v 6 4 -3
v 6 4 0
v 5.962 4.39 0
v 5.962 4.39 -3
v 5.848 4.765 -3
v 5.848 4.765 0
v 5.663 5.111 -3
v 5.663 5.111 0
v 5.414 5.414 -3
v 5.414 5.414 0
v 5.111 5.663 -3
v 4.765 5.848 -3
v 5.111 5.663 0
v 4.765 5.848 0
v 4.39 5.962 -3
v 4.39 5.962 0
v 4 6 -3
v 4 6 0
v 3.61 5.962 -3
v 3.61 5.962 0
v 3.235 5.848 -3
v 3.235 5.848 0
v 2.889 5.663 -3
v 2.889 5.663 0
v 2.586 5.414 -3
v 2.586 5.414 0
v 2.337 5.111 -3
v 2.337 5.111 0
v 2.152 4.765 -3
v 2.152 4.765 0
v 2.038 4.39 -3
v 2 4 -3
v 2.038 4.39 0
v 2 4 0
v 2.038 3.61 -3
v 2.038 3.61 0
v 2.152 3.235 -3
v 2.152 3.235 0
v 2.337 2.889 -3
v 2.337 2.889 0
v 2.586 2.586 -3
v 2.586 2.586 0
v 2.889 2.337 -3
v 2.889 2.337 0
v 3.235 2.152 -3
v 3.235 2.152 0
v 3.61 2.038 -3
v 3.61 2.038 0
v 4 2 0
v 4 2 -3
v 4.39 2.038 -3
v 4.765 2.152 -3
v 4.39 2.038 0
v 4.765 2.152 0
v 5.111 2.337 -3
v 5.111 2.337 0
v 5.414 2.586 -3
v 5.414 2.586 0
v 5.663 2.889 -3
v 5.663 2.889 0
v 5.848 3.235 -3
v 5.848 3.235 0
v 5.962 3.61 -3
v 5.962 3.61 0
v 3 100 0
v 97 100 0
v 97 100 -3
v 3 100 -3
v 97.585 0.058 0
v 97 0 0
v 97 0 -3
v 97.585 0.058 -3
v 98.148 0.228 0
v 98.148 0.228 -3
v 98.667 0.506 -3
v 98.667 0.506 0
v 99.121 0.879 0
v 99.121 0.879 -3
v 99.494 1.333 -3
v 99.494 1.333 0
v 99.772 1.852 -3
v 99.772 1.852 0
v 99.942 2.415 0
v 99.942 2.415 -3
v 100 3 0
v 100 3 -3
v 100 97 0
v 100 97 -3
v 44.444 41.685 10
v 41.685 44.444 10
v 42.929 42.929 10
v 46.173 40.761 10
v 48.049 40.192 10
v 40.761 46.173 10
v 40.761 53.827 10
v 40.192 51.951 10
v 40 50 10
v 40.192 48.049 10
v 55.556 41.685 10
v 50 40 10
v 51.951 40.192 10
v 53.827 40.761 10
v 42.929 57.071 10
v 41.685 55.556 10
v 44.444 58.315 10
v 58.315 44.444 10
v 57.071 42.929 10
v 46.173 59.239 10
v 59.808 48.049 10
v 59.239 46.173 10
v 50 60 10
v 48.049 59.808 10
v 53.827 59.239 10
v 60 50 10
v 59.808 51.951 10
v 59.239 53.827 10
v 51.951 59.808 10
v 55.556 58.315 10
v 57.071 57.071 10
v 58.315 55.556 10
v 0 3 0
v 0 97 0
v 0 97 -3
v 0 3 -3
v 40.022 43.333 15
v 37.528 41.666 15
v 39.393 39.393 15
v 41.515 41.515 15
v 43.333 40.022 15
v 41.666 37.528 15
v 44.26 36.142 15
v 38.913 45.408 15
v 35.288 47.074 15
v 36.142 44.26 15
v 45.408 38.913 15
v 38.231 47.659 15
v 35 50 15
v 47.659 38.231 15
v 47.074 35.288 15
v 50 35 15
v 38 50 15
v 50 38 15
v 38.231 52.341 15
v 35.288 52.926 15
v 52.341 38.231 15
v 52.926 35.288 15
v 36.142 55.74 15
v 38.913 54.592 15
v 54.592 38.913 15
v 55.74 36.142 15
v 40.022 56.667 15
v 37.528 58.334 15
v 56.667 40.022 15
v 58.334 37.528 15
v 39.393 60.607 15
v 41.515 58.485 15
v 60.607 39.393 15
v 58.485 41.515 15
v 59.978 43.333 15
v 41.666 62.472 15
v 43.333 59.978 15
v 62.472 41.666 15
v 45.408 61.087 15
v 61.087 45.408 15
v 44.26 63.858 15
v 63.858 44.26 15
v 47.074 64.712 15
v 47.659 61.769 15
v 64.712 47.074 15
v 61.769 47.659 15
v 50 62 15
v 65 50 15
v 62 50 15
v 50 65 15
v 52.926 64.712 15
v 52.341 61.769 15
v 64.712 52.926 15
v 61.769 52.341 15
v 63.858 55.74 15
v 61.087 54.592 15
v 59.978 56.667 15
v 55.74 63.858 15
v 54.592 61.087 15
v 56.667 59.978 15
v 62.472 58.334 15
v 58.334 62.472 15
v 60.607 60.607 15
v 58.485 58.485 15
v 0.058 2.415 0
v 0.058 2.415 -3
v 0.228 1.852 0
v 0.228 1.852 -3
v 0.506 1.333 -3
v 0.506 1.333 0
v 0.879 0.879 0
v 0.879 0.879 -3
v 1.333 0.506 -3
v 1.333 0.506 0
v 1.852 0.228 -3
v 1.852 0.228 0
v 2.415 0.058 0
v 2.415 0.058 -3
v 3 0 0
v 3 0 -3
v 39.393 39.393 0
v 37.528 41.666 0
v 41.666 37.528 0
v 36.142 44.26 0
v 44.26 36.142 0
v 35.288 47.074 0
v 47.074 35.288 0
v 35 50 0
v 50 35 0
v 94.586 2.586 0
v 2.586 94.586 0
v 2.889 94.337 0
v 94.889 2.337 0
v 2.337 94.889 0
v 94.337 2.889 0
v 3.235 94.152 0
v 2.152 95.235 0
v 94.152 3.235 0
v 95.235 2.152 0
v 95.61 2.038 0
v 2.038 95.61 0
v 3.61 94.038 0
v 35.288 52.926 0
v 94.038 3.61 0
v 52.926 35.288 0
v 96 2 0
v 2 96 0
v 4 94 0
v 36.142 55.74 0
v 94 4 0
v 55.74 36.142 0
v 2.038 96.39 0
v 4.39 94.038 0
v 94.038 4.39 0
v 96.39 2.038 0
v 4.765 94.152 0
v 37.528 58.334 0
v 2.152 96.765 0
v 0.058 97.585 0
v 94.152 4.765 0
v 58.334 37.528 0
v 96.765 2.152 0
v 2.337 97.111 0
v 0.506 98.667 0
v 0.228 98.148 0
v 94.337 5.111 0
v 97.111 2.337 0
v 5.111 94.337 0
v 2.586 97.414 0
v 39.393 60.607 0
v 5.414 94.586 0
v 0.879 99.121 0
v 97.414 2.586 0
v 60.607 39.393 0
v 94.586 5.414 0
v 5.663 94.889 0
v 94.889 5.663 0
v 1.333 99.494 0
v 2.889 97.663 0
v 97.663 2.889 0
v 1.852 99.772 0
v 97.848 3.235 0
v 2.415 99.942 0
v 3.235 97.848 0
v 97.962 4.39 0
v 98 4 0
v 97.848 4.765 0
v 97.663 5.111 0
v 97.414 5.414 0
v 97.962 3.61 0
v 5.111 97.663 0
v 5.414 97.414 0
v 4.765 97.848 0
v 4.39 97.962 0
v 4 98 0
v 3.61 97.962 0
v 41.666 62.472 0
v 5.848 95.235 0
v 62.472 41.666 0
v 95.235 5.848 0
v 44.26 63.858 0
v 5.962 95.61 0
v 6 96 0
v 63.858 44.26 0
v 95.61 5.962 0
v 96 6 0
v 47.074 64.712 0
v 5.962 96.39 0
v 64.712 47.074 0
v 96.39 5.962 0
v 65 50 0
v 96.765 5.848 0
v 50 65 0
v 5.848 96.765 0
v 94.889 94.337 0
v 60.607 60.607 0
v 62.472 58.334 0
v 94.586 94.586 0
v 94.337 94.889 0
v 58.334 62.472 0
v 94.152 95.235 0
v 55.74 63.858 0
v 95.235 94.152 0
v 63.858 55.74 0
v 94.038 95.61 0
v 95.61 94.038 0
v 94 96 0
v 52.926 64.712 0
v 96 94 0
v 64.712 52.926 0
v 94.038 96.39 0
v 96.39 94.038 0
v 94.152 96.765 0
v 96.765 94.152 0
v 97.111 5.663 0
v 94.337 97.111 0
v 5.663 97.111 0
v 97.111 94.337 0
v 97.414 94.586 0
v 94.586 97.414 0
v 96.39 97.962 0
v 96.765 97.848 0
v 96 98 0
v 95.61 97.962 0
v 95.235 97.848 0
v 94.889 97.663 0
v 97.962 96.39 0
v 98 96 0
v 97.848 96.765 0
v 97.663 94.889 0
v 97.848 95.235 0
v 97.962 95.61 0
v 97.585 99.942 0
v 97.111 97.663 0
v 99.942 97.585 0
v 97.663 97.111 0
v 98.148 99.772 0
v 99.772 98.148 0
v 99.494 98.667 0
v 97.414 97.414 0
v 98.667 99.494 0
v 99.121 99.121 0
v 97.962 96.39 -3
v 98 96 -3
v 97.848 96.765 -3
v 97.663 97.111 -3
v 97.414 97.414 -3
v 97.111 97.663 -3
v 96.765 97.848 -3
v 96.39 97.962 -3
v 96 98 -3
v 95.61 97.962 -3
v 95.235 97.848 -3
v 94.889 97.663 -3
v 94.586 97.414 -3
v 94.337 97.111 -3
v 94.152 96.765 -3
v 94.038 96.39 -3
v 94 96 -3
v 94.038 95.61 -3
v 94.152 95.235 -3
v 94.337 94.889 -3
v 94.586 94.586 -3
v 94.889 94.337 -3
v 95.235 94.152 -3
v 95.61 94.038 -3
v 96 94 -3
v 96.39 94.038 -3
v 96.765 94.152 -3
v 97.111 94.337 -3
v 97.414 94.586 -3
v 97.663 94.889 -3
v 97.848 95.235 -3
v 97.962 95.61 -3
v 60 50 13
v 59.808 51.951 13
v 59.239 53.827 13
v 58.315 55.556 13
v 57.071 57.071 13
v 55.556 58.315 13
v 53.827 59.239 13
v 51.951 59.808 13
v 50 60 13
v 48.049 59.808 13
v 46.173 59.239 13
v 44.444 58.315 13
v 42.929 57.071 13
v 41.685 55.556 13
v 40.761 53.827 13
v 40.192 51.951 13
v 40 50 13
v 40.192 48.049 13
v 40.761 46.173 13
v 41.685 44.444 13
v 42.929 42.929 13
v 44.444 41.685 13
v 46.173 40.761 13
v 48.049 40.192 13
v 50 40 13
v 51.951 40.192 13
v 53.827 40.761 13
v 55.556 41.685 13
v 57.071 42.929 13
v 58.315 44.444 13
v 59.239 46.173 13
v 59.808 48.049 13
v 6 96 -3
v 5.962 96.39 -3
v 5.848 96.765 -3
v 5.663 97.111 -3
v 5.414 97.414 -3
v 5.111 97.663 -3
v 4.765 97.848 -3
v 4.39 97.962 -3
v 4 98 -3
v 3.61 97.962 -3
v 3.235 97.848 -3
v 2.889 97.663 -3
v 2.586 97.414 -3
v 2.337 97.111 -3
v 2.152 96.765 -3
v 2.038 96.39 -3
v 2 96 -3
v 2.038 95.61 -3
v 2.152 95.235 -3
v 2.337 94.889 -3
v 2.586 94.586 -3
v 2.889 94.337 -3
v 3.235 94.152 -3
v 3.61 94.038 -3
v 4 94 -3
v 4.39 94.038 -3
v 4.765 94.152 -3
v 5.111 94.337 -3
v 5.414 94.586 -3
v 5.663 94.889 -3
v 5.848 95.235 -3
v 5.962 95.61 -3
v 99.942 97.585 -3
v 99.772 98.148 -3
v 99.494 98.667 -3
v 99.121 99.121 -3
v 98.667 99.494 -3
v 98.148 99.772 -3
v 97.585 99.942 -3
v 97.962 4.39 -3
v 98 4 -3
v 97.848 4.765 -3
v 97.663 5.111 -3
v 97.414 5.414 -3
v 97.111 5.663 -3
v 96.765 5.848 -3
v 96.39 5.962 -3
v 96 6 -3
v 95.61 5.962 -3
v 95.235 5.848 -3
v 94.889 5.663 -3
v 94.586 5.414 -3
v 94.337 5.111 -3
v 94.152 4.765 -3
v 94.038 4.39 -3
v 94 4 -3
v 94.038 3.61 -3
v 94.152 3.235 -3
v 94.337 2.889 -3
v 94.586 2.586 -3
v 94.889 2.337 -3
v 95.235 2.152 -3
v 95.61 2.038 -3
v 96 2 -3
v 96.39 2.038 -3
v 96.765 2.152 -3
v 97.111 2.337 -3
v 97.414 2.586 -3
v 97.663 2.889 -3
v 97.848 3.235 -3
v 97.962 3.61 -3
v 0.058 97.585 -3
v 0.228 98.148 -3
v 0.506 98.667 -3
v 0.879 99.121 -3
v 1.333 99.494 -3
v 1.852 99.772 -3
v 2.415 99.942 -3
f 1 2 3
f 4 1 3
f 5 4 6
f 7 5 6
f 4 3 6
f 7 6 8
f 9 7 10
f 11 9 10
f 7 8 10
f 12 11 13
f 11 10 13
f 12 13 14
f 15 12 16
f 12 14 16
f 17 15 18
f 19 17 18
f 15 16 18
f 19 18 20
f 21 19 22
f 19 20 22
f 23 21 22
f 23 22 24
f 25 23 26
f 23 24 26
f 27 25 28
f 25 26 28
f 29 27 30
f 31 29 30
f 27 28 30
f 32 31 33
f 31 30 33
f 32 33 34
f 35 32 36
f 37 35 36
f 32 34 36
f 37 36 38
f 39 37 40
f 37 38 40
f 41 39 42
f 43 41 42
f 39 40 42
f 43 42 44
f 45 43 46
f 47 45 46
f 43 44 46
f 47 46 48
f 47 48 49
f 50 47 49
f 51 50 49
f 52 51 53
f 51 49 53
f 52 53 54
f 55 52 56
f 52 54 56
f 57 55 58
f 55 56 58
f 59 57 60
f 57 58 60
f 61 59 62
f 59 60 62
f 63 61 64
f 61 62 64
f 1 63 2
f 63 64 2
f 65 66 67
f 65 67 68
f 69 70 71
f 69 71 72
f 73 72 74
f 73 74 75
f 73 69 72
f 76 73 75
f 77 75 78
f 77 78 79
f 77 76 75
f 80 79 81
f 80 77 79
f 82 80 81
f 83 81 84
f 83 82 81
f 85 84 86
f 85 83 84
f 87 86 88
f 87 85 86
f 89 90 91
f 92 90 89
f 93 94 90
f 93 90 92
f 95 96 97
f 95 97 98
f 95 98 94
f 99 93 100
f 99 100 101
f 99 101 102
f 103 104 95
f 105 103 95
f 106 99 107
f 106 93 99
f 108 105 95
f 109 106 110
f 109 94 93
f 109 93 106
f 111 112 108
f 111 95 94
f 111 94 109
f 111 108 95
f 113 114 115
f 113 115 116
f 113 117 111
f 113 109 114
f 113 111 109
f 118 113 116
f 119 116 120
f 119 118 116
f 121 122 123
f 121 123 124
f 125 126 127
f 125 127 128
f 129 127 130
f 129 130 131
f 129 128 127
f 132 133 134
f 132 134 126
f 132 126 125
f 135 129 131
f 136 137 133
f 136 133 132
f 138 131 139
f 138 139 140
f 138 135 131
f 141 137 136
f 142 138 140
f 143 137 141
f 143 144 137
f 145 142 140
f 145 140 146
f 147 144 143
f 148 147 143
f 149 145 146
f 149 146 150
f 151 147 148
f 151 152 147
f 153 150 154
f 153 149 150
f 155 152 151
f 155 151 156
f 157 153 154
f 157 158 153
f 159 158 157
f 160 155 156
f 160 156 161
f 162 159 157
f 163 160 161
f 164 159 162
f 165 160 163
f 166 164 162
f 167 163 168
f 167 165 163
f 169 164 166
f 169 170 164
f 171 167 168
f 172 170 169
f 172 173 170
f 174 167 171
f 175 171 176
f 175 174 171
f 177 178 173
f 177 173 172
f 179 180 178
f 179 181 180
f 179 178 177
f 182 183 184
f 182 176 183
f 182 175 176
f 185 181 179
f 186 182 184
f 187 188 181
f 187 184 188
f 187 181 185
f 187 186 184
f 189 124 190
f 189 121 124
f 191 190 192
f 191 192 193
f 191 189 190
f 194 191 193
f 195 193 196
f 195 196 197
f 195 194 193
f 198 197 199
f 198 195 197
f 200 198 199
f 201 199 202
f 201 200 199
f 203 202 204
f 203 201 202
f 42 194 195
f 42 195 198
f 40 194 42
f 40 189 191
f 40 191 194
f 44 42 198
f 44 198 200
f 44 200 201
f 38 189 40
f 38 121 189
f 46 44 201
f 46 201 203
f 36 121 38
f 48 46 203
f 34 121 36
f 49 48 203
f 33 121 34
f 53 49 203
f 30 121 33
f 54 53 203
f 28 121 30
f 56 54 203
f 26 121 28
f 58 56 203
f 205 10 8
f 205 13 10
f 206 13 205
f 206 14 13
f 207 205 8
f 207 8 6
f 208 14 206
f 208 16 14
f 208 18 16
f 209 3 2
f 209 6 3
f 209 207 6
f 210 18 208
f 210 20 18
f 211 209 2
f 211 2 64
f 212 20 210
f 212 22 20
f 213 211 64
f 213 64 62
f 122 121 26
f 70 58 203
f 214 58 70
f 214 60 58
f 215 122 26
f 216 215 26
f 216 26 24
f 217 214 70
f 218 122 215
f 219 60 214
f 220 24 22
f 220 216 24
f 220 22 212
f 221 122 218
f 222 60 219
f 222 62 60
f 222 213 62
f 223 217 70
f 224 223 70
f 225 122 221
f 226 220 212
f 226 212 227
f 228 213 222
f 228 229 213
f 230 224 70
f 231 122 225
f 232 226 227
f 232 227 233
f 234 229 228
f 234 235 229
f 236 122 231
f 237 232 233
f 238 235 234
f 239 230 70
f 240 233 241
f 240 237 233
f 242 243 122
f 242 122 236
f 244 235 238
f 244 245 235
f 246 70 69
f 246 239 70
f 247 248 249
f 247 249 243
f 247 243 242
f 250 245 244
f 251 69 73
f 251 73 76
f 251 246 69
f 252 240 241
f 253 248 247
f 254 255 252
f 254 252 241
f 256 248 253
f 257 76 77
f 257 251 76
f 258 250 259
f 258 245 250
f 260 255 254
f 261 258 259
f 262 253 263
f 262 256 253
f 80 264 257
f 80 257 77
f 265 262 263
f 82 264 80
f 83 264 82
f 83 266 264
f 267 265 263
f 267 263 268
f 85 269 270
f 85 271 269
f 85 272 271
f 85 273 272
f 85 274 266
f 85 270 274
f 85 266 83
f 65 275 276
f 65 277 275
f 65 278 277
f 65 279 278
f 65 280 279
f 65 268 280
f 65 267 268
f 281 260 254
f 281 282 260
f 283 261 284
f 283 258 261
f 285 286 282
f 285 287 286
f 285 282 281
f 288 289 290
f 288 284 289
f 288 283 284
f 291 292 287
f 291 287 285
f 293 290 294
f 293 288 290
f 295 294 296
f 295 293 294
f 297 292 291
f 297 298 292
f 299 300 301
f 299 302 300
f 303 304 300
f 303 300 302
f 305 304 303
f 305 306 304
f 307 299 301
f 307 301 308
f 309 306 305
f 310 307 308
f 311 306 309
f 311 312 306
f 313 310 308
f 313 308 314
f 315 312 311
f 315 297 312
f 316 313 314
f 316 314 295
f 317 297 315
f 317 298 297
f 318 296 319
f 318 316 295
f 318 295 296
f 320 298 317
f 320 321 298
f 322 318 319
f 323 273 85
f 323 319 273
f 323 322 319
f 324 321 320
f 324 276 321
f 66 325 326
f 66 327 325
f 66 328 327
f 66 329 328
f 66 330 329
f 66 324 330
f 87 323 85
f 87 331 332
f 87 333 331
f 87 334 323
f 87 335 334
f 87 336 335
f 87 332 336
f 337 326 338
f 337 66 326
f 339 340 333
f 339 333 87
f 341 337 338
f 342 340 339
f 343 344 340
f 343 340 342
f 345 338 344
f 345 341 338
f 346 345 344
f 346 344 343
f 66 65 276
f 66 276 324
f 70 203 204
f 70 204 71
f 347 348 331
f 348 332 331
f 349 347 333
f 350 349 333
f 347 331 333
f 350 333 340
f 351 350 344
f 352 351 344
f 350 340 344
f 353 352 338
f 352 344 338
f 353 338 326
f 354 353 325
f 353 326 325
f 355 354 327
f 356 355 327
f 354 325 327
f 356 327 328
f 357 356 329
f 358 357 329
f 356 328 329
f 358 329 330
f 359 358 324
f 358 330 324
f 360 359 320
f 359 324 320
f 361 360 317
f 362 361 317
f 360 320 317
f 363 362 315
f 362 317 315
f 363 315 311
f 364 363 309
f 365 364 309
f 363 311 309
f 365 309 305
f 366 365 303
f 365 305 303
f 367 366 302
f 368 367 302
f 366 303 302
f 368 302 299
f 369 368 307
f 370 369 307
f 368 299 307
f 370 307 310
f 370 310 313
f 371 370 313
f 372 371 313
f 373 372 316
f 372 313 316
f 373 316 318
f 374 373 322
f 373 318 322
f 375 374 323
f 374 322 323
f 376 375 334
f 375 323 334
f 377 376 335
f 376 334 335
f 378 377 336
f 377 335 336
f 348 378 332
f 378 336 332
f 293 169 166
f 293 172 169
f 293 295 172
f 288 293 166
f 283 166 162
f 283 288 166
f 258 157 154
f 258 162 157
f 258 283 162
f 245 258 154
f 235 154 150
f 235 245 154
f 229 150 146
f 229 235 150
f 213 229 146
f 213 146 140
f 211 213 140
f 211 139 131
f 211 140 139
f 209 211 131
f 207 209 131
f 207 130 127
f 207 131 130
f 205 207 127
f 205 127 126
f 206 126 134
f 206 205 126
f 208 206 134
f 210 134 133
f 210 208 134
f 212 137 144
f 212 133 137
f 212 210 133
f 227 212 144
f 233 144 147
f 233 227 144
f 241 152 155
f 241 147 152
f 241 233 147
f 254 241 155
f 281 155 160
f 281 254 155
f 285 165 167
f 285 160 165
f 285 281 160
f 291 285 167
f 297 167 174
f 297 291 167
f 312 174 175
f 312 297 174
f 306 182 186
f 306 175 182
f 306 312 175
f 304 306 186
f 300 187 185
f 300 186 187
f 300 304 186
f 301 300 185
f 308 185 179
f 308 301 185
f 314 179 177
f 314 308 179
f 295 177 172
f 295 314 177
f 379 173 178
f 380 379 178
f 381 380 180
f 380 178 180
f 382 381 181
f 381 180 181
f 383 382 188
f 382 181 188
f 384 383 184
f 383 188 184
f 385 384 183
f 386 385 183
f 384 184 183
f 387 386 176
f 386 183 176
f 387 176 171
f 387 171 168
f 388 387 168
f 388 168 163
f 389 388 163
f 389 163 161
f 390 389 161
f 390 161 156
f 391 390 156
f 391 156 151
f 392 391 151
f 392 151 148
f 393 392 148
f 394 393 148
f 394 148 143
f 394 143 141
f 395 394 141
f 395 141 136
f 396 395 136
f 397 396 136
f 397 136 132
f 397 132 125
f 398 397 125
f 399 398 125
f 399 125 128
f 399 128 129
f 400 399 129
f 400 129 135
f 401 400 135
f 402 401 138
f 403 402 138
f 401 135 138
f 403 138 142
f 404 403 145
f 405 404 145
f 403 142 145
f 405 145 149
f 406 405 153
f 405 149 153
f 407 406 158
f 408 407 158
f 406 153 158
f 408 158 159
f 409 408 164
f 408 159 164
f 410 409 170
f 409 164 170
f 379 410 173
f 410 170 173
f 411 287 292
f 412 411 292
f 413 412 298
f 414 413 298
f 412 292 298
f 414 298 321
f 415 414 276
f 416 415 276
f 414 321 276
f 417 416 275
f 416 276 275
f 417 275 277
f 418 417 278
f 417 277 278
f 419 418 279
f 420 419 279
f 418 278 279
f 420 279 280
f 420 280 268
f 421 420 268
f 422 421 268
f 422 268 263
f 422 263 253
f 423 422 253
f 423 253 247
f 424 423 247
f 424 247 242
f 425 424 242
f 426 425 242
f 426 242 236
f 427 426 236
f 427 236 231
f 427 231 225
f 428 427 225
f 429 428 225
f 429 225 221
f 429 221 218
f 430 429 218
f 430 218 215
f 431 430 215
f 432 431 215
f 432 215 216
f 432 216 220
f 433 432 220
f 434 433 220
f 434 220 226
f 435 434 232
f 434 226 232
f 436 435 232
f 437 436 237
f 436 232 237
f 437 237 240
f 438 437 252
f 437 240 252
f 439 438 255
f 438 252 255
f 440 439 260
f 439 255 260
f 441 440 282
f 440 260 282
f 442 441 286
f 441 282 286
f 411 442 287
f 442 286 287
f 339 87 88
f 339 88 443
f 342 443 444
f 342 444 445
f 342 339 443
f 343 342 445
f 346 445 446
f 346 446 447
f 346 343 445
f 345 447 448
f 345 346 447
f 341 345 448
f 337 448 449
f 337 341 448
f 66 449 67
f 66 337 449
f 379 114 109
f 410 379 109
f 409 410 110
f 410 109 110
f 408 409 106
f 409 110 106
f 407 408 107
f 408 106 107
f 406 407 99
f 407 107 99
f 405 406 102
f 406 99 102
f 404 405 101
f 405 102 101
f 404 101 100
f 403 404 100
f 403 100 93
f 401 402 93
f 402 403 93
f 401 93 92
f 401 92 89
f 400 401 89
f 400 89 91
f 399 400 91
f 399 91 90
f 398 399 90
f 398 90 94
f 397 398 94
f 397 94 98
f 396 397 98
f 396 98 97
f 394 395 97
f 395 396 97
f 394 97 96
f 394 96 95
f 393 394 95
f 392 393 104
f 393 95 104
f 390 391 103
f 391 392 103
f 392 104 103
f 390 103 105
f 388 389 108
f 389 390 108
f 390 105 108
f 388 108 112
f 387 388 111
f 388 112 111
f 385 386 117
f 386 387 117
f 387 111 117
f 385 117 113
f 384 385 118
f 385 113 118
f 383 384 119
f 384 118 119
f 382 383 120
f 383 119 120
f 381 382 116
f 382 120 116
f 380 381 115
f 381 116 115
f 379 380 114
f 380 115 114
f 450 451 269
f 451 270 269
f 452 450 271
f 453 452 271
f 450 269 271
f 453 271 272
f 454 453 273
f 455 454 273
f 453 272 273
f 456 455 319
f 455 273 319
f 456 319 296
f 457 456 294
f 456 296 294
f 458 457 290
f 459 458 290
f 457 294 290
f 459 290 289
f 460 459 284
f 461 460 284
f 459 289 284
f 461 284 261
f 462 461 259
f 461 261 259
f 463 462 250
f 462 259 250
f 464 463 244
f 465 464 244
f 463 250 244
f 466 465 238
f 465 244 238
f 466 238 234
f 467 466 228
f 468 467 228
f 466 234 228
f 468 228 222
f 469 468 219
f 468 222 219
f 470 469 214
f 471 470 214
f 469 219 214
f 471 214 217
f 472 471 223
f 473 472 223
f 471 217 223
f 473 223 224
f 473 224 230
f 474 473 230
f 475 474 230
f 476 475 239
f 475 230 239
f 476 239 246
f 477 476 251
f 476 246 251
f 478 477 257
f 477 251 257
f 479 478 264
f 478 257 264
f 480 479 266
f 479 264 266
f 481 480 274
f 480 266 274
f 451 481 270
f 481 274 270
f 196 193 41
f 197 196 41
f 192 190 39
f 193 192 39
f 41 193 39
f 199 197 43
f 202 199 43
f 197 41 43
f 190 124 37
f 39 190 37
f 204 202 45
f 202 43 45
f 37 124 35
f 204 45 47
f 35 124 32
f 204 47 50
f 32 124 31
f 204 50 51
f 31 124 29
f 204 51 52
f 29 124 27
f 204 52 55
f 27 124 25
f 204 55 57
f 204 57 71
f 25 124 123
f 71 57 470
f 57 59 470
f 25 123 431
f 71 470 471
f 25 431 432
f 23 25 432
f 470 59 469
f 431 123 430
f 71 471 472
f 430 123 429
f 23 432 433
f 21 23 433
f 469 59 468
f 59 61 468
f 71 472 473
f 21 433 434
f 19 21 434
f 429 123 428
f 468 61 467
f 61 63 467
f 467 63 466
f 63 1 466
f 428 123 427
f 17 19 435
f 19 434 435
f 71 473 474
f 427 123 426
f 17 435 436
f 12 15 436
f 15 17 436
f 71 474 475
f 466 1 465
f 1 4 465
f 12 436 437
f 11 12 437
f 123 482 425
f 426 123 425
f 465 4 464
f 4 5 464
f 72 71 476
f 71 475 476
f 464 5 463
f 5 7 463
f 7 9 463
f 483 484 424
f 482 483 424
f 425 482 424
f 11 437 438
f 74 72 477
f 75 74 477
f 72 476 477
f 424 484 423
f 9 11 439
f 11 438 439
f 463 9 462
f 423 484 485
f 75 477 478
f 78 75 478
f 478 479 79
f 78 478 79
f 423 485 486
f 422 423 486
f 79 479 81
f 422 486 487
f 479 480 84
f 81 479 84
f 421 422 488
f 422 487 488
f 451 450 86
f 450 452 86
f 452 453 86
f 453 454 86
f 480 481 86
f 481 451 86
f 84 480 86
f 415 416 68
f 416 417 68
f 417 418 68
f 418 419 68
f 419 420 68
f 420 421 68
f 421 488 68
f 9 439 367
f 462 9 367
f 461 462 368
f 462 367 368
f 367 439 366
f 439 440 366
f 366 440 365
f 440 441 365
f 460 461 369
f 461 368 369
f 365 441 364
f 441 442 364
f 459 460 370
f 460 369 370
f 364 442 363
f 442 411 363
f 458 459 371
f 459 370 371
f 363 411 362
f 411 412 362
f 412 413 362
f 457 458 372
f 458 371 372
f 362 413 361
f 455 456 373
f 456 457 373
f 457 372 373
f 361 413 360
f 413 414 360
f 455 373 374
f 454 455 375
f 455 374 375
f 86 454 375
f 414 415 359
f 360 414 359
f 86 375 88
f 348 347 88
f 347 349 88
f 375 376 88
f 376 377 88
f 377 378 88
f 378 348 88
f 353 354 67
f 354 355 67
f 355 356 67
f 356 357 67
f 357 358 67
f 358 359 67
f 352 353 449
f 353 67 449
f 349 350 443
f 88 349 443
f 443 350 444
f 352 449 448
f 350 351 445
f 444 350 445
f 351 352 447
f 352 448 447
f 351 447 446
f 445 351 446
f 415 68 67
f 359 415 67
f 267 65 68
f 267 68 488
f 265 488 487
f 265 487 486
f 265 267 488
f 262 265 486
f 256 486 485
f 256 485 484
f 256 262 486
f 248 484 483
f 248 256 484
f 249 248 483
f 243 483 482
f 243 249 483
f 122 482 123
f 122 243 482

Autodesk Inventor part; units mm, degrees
ref_plane "YZ Plane" through (0, 0, 0) normal (1, 0, 0) x (0, 1, 0)
ref_plane "XZ Plane" through (0, 0, 0) normal (0, 1, 0) x (-1, 0, 0)
ref_plane "XY Plane" through (0, 0, 0) normal (0, 0, 1) x (1, 0, 0)
sketch "Sketch1" plane through (0, 0, 0) normal (0, 0, 1) x (1, 0, 0)
  line L0 (3, 0) -> (97, 0)
  line L1 (100, 3) -> (100, 97)
  line L2 (97, 100) -> (3, 100)
  line L3 (0, 97) -> (0, 3)
  line L4 (4, 96) -> (96, 96) construction
  line L5 (96, 96) -> (96, 4) construction
  line L6 (96, 4) -> (4, 4) construction
  line L7 (4, 4) -> (4, 96) construction
  arc A0 (3, 100) -> (0, 97) centre (3, 97) ccw
  arc A1 (0, 3) -> (3, 0) centre (3, 3) ccw
  arc A2 (97, 0) -> (100, 3) centre (97, 3) ccw
  arc A3 (100, 97) -> (97, 100) centre (97, 97) ccw
  circle A4 centre (4, 96) radius 2
  circle A5 centre (4, 4) radius 2
  circle A6 centre (96, 4) radius 2
  circle A7 centre (96, 96) radius 2
  circle A8 centre (50, 50) radius 15
  circle A9 centre (50, 50) radius 10
  point P0 (0, 0)
  point P1 (100, 100)
  point P2 (100, 0)
  point P3 (0, 100)
  point P4 (50, 96)
  point P5 (4, 50)
  dimension "d0" = 100
  dimension "d1" = 100
  dimension "d2" = 4
  dimension "d3" = 3
  dimension "d4" = 4
  dimension "d5" = 20
  dimension "d6" = 30
extrude "Extrusion1" add sketch "Sketch1" against normal blind 3 contours A1 L3 A0 L2 A3 L1 A2 L0 | A8 | A9
extrude "Extrusion2" add sketch "Sketch1" along normal blind 15 contours A8
extrude "Extrusion3" add sketch "Sketch1" along normal blind 10 contours A9
chamfer "Chamfer1" distance 2 angle 45 1 edges at (40, 50, 15)
properties part number "CAMERA"
